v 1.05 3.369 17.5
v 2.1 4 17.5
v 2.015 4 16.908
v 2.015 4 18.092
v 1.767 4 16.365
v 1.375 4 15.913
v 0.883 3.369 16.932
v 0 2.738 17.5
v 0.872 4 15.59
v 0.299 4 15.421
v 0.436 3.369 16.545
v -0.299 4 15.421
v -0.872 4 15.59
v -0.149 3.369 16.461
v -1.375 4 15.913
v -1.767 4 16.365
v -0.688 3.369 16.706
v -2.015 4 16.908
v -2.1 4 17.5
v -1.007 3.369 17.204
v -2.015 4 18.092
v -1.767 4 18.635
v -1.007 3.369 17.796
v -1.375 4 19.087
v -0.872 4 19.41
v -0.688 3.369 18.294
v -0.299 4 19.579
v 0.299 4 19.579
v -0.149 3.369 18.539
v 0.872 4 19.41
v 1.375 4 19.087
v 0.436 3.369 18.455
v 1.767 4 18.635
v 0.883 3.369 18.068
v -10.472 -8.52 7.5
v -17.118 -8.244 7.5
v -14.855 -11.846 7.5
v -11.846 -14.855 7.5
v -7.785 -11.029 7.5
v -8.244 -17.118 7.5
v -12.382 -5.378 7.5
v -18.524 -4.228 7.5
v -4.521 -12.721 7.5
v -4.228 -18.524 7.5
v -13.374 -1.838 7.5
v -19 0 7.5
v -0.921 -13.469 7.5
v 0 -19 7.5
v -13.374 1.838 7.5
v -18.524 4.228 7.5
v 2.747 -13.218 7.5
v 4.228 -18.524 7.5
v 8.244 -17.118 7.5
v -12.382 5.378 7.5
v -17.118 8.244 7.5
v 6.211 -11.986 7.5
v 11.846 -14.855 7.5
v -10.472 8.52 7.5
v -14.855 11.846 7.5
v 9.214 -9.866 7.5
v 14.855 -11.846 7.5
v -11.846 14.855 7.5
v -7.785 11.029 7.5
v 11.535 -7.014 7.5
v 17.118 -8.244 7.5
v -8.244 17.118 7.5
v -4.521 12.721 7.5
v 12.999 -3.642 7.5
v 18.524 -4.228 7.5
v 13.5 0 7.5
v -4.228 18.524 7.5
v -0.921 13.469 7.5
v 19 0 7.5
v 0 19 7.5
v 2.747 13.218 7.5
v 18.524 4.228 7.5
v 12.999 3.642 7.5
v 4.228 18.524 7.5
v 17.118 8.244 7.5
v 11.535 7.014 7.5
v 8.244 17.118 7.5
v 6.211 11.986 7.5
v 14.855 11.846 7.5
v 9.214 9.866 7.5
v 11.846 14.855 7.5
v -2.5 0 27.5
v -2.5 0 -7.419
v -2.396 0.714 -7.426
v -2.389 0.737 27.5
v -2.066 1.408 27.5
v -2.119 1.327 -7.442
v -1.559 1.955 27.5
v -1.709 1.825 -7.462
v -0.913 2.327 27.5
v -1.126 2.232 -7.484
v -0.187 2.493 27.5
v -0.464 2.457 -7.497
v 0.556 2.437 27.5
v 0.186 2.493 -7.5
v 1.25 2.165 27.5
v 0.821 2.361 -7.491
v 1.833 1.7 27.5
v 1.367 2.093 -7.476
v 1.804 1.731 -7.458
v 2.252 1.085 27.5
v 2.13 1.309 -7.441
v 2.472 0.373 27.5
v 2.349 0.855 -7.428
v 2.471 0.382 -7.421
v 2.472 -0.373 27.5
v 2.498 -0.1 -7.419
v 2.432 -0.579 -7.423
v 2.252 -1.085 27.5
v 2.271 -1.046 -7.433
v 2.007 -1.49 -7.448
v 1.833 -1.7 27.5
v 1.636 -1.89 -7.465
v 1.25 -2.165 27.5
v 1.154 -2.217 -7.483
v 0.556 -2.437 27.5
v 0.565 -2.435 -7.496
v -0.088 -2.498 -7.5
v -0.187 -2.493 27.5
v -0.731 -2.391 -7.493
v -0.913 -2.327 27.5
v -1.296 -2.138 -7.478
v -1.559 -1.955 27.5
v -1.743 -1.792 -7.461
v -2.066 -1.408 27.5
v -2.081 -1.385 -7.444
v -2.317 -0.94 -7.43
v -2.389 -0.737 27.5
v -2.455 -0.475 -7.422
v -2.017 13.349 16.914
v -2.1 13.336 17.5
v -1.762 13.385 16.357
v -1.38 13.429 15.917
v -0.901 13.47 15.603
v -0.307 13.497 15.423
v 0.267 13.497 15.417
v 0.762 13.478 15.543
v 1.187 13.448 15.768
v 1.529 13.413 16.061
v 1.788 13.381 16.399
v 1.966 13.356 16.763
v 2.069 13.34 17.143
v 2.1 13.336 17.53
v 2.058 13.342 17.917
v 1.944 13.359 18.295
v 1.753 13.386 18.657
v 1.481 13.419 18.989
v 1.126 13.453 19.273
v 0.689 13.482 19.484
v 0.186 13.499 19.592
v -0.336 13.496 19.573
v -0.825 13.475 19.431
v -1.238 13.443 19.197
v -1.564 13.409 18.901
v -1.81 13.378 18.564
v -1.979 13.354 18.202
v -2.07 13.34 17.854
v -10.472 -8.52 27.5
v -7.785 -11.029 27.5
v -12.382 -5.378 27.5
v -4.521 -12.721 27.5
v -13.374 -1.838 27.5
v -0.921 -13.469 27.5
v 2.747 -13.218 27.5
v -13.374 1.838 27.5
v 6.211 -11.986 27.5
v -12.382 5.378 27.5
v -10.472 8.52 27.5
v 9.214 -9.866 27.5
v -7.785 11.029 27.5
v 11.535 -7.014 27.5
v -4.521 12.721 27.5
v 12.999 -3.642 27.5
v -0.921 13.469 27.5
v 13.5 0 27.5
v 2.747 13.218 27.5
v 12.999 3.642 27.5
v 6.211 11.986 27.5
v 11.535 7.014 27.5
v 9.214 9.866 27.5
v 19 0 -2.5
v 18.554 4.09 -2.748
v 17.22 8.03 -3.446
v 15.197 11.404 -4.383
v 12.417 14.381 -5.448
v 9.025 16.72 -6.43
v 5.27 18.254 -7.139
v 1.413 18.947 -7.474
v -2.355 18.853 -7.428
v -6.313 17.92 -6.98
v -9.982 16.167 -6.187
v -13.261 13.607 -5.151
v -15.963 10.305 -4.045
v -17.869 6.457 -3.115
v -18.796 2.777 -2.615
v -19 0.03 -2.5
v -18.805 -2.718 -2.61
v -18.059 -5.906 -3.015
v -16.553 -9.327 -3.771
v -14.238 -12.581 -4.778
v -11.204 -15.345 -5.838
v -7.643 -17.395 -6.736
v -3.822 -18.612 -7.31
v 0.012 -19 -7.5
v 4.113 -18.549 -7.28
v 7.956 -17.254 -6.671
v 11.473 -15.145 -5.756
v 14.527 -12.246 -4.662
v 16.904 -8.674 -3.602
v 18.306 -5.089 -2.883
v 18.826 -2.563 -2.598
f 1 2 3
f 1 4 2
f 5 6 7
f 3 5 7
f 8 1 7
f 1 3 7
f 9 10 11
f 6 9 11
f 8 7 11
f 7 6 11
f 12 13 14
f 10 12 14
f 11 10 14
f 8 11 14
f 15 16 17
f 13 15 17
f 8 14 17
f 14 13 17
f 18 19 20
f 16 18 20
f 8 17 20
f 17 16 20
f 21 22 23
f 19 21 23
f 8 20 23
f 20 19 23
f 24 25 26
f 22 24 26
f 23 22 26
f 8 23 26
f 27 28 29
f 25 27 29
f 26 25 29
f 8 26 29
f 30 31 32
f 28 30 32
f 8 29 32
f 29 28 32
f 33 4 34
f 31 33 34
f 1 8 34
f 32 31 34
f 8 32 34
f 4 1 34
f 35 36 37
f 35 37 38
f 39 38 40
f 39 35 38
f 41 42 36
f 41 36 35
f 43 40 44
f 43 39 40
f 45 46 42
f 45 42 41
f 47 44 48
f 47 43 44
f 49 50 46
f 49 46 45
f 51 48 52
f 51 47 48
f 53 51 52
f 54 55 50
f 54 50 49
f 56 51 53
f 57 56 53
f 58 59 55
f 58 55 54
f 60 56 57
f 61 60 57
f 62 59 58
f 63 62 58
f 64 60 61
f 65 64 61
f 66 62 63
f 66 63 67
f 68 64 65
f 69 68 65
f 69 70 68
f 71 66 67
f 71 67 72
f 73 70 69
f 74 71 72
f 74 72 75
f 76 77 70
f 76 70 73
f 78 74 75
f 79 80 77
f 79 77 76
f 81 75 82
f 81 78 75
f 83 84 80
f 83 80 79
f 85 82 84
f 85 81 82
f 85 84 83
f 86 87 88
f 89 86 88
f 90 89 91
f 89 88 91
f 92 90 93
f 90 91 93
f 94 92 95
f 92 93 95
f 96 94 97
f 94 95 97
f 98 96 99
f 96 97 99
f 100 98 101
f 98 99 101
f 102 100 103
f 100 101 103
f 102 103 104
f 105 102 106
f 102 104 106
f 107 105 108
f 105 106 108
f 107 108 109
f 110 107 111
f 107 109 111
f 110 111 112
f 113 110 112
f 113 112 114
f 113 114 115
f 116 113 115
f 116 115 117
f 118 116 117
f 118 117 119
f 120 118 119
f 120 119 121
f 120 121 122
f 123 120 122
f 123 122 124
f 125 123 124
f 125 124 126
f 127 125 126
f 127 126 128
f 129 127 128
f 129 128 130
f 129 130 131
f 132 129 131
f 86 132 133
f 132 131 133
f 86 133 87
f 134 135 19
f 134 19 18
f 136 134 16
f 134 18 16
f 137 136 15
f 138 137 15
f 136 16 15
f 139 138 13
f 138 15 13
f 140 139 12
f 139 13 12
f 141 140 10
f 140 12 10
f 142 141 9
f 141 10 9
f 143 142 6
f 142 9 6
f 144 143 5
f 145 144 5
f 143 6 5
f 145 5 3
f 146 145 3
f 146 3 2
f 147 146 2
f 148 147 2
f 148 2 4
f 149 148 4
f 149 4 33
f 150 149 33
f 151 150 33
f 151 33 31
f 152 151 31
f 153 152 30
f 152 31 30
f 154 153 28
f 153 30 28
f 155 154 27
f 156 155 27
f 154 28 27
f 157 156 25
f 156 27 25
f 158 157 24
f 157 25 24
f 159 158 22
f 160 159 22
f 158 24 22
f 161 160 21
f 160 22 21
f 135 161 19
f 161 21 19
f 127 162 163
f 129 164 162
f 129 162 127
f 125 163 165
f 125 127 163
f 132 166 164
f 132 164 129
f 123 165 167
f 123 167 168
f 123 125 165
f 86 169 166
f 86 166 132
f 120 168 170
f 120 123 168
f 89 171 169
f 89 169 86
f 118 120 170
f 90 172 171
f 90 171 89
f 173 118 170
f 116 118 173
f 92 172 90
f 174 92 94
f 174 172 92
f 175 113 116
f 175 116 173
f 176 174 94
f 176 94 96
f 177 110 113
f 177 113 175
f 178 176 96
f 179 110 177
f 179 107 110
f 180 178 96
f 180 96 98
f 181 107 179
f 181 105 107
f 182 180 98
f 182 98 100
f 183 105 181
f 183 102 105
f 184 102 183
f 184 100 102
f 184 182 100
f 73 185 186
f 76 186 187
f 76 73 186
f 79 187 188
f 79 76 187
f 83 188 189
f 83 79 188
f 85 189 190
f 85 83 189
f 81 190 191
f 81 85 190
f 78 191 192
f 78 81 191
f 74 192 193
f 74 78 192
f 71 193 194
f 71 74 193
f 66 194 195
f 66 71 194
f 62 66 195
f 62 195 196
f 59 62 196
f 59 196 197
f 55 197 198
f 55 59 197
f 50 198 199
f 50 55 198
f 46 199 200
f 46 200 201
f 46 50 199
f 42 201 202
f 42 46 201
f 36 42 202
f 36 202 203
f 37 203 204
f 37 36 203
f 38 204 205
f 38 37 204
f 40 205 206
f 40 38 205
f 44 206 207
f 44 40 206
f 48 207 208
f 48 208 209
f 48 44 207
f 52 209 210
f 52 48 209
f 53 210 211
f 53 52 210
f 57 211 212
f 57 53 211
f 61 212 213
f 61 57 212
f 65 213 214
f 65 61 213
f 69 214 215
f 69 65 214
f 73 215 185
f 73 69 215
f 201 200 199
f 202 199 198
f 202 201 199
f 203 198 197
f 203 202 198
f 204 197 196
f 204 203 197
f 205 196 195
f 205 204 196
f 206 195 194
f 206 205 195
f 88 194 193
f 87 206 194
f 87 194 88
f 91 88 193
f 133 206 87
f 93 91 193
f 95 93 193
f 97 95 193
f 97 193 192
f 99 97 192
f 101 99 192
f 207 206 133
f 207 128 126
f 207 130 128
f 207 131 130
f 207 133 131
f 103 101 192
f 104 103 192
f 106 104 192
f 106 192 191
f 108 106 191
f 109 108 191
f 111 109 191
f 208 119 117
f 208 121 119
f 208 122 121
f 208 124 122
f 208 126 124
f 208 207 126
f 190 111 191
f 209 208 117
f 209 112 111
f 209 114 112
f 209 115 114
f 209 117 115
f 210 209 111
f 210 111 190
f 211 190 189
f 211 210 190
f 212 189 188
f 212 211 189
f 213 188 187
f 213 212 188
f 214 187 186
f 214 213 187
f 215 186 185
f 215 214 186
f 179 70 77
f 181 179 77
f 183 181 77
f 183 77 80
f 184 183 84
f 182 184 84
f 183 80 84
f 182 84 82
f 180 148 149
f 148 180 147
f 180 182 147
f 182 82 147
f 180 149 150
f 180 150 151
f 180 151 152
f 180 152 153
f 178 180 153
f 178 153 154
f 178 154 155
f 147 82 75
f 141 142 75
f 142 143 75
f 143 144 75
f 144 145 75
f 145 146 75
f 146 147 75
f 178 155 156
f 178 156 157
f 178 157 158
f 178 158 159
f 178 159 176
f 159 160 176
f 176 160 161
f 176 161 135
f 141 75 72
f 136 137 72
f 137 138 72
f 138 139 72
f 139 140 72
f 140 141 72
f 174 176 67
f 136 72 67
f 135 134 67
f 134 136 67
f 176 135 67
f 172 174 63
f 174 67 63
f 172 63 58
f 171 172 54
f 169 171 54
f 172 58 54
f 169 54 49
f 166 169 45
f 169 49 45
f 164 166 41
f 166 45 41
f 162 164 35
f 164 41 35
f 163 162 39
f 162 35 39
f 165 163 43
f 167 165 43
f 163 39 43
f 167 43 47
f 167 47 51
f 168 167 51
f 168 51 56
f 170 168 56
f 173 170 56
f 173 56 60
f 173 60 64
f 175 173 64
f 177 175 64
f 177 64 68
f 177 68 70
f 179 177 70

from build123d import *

# Parameters (mm, degrees)
ESBO_O1_R                  = 19
RESSALTO_EXTRUS_O1_DEPTH   = 7.5
CORTE_EXTRUS_O1_DEPTH      = 28.897132469
CORTE_EXTRUS_O1_DEPTH_BACK = 28.897132469
ESBO_O3_R                  = 13.5
RESSALTO_EXTRUS_O2_DEPTH   = 20
FURO_ROSCADO_DE_M61_D      = 5
FURO_ROSCADO_DE_M51_D      = 4.2
FURO_ROSCADO_DE_M51_DEPTH  = 10
FURO_ROSCADO_DE_M51_TIP    = 1.2618073


with BuildPart() as part:
    # Esboço1 → Ressalto-extrusão1 (new, symmetric)
    with BuildSketch(Plane.XY):
        Circle(ESBO_O1_R)
    extrude(amount=RESSALTO_EXTRUS_O1_DEPTH, both=True)

    # Esboço2 → Corte-extrusão1 (cut, two sides: drawn at the far end of the back side and taken through both)
    with BuildSketch(Plane(origin=(0, 0, 0), x_dir=(1, 0, 0), z_dir=(0, 1, 0)).offset(-CORTE_EXTRUS_O1_DEPTH_BACK)):
        with BuildLine():
            Line((-96.112462059, -41.105261283), (-19, 2.5))
            ThreePointArc((-19, 2.5), (0, 7.5), (19, 2.5))
            Line((19, 2.5), (96.112462059, -41.105261283))
            Line((96.112462059, -41.105261283), (96.112462059, 136.069800352))
            Line((96.112462059, 136.069800352), (-96.112462059, 136.069800352))
            Line((-96.112462059, 136.069800352), (-96.112462059, -41.105261283))
        make_face()
    extrude(amount=CORTE_EXTRUS_O1_DEPTH + CORTE_EXTRUS_O1_DEPTH_BACK, mode=Mode.SUBTRACT)

    # Esboço3 → Ressalto-extrusão2 (add)
    with BuildSketch(Plane.XY.offset(7.5)):
        Circle(ESBO_O3_R)
    extrude(amount=RESSALTO_EXTRUS_O2_DEPTH)

    # Furo roscado de M61 (through all)
    with Locations(Plane.XY.offset(27.5)):
        with Locations((0, 0)):
            Hole(FURO_ROSCADO_DE_M61_D / 2)

    # Furo roscado de M51
    with Locations(Plane(origin=(0, 14, 0), x_dir=(1, 0, 0), z_dir=(0, 1, 0))):
        with Locations((0, -17.5)):
            Hole(FURO_ROSCADO_DE_M51_D / 2, depth=FURO_ROSCADO_DE_M51_DEPTH)
            with Locations((0, 0, -(FURO_ROSCADO_DE_M51_DEPTH + FURO_ROSCADO_DE_M51_TIP / 2))):  # 118° drill point
                Cone(0, FURO_ROSCADO_DE_M51_D / 2, FURO_ROSCADO_DE_M51_TIP, mode=Mode.SUBTRACT)


solid = part.part
